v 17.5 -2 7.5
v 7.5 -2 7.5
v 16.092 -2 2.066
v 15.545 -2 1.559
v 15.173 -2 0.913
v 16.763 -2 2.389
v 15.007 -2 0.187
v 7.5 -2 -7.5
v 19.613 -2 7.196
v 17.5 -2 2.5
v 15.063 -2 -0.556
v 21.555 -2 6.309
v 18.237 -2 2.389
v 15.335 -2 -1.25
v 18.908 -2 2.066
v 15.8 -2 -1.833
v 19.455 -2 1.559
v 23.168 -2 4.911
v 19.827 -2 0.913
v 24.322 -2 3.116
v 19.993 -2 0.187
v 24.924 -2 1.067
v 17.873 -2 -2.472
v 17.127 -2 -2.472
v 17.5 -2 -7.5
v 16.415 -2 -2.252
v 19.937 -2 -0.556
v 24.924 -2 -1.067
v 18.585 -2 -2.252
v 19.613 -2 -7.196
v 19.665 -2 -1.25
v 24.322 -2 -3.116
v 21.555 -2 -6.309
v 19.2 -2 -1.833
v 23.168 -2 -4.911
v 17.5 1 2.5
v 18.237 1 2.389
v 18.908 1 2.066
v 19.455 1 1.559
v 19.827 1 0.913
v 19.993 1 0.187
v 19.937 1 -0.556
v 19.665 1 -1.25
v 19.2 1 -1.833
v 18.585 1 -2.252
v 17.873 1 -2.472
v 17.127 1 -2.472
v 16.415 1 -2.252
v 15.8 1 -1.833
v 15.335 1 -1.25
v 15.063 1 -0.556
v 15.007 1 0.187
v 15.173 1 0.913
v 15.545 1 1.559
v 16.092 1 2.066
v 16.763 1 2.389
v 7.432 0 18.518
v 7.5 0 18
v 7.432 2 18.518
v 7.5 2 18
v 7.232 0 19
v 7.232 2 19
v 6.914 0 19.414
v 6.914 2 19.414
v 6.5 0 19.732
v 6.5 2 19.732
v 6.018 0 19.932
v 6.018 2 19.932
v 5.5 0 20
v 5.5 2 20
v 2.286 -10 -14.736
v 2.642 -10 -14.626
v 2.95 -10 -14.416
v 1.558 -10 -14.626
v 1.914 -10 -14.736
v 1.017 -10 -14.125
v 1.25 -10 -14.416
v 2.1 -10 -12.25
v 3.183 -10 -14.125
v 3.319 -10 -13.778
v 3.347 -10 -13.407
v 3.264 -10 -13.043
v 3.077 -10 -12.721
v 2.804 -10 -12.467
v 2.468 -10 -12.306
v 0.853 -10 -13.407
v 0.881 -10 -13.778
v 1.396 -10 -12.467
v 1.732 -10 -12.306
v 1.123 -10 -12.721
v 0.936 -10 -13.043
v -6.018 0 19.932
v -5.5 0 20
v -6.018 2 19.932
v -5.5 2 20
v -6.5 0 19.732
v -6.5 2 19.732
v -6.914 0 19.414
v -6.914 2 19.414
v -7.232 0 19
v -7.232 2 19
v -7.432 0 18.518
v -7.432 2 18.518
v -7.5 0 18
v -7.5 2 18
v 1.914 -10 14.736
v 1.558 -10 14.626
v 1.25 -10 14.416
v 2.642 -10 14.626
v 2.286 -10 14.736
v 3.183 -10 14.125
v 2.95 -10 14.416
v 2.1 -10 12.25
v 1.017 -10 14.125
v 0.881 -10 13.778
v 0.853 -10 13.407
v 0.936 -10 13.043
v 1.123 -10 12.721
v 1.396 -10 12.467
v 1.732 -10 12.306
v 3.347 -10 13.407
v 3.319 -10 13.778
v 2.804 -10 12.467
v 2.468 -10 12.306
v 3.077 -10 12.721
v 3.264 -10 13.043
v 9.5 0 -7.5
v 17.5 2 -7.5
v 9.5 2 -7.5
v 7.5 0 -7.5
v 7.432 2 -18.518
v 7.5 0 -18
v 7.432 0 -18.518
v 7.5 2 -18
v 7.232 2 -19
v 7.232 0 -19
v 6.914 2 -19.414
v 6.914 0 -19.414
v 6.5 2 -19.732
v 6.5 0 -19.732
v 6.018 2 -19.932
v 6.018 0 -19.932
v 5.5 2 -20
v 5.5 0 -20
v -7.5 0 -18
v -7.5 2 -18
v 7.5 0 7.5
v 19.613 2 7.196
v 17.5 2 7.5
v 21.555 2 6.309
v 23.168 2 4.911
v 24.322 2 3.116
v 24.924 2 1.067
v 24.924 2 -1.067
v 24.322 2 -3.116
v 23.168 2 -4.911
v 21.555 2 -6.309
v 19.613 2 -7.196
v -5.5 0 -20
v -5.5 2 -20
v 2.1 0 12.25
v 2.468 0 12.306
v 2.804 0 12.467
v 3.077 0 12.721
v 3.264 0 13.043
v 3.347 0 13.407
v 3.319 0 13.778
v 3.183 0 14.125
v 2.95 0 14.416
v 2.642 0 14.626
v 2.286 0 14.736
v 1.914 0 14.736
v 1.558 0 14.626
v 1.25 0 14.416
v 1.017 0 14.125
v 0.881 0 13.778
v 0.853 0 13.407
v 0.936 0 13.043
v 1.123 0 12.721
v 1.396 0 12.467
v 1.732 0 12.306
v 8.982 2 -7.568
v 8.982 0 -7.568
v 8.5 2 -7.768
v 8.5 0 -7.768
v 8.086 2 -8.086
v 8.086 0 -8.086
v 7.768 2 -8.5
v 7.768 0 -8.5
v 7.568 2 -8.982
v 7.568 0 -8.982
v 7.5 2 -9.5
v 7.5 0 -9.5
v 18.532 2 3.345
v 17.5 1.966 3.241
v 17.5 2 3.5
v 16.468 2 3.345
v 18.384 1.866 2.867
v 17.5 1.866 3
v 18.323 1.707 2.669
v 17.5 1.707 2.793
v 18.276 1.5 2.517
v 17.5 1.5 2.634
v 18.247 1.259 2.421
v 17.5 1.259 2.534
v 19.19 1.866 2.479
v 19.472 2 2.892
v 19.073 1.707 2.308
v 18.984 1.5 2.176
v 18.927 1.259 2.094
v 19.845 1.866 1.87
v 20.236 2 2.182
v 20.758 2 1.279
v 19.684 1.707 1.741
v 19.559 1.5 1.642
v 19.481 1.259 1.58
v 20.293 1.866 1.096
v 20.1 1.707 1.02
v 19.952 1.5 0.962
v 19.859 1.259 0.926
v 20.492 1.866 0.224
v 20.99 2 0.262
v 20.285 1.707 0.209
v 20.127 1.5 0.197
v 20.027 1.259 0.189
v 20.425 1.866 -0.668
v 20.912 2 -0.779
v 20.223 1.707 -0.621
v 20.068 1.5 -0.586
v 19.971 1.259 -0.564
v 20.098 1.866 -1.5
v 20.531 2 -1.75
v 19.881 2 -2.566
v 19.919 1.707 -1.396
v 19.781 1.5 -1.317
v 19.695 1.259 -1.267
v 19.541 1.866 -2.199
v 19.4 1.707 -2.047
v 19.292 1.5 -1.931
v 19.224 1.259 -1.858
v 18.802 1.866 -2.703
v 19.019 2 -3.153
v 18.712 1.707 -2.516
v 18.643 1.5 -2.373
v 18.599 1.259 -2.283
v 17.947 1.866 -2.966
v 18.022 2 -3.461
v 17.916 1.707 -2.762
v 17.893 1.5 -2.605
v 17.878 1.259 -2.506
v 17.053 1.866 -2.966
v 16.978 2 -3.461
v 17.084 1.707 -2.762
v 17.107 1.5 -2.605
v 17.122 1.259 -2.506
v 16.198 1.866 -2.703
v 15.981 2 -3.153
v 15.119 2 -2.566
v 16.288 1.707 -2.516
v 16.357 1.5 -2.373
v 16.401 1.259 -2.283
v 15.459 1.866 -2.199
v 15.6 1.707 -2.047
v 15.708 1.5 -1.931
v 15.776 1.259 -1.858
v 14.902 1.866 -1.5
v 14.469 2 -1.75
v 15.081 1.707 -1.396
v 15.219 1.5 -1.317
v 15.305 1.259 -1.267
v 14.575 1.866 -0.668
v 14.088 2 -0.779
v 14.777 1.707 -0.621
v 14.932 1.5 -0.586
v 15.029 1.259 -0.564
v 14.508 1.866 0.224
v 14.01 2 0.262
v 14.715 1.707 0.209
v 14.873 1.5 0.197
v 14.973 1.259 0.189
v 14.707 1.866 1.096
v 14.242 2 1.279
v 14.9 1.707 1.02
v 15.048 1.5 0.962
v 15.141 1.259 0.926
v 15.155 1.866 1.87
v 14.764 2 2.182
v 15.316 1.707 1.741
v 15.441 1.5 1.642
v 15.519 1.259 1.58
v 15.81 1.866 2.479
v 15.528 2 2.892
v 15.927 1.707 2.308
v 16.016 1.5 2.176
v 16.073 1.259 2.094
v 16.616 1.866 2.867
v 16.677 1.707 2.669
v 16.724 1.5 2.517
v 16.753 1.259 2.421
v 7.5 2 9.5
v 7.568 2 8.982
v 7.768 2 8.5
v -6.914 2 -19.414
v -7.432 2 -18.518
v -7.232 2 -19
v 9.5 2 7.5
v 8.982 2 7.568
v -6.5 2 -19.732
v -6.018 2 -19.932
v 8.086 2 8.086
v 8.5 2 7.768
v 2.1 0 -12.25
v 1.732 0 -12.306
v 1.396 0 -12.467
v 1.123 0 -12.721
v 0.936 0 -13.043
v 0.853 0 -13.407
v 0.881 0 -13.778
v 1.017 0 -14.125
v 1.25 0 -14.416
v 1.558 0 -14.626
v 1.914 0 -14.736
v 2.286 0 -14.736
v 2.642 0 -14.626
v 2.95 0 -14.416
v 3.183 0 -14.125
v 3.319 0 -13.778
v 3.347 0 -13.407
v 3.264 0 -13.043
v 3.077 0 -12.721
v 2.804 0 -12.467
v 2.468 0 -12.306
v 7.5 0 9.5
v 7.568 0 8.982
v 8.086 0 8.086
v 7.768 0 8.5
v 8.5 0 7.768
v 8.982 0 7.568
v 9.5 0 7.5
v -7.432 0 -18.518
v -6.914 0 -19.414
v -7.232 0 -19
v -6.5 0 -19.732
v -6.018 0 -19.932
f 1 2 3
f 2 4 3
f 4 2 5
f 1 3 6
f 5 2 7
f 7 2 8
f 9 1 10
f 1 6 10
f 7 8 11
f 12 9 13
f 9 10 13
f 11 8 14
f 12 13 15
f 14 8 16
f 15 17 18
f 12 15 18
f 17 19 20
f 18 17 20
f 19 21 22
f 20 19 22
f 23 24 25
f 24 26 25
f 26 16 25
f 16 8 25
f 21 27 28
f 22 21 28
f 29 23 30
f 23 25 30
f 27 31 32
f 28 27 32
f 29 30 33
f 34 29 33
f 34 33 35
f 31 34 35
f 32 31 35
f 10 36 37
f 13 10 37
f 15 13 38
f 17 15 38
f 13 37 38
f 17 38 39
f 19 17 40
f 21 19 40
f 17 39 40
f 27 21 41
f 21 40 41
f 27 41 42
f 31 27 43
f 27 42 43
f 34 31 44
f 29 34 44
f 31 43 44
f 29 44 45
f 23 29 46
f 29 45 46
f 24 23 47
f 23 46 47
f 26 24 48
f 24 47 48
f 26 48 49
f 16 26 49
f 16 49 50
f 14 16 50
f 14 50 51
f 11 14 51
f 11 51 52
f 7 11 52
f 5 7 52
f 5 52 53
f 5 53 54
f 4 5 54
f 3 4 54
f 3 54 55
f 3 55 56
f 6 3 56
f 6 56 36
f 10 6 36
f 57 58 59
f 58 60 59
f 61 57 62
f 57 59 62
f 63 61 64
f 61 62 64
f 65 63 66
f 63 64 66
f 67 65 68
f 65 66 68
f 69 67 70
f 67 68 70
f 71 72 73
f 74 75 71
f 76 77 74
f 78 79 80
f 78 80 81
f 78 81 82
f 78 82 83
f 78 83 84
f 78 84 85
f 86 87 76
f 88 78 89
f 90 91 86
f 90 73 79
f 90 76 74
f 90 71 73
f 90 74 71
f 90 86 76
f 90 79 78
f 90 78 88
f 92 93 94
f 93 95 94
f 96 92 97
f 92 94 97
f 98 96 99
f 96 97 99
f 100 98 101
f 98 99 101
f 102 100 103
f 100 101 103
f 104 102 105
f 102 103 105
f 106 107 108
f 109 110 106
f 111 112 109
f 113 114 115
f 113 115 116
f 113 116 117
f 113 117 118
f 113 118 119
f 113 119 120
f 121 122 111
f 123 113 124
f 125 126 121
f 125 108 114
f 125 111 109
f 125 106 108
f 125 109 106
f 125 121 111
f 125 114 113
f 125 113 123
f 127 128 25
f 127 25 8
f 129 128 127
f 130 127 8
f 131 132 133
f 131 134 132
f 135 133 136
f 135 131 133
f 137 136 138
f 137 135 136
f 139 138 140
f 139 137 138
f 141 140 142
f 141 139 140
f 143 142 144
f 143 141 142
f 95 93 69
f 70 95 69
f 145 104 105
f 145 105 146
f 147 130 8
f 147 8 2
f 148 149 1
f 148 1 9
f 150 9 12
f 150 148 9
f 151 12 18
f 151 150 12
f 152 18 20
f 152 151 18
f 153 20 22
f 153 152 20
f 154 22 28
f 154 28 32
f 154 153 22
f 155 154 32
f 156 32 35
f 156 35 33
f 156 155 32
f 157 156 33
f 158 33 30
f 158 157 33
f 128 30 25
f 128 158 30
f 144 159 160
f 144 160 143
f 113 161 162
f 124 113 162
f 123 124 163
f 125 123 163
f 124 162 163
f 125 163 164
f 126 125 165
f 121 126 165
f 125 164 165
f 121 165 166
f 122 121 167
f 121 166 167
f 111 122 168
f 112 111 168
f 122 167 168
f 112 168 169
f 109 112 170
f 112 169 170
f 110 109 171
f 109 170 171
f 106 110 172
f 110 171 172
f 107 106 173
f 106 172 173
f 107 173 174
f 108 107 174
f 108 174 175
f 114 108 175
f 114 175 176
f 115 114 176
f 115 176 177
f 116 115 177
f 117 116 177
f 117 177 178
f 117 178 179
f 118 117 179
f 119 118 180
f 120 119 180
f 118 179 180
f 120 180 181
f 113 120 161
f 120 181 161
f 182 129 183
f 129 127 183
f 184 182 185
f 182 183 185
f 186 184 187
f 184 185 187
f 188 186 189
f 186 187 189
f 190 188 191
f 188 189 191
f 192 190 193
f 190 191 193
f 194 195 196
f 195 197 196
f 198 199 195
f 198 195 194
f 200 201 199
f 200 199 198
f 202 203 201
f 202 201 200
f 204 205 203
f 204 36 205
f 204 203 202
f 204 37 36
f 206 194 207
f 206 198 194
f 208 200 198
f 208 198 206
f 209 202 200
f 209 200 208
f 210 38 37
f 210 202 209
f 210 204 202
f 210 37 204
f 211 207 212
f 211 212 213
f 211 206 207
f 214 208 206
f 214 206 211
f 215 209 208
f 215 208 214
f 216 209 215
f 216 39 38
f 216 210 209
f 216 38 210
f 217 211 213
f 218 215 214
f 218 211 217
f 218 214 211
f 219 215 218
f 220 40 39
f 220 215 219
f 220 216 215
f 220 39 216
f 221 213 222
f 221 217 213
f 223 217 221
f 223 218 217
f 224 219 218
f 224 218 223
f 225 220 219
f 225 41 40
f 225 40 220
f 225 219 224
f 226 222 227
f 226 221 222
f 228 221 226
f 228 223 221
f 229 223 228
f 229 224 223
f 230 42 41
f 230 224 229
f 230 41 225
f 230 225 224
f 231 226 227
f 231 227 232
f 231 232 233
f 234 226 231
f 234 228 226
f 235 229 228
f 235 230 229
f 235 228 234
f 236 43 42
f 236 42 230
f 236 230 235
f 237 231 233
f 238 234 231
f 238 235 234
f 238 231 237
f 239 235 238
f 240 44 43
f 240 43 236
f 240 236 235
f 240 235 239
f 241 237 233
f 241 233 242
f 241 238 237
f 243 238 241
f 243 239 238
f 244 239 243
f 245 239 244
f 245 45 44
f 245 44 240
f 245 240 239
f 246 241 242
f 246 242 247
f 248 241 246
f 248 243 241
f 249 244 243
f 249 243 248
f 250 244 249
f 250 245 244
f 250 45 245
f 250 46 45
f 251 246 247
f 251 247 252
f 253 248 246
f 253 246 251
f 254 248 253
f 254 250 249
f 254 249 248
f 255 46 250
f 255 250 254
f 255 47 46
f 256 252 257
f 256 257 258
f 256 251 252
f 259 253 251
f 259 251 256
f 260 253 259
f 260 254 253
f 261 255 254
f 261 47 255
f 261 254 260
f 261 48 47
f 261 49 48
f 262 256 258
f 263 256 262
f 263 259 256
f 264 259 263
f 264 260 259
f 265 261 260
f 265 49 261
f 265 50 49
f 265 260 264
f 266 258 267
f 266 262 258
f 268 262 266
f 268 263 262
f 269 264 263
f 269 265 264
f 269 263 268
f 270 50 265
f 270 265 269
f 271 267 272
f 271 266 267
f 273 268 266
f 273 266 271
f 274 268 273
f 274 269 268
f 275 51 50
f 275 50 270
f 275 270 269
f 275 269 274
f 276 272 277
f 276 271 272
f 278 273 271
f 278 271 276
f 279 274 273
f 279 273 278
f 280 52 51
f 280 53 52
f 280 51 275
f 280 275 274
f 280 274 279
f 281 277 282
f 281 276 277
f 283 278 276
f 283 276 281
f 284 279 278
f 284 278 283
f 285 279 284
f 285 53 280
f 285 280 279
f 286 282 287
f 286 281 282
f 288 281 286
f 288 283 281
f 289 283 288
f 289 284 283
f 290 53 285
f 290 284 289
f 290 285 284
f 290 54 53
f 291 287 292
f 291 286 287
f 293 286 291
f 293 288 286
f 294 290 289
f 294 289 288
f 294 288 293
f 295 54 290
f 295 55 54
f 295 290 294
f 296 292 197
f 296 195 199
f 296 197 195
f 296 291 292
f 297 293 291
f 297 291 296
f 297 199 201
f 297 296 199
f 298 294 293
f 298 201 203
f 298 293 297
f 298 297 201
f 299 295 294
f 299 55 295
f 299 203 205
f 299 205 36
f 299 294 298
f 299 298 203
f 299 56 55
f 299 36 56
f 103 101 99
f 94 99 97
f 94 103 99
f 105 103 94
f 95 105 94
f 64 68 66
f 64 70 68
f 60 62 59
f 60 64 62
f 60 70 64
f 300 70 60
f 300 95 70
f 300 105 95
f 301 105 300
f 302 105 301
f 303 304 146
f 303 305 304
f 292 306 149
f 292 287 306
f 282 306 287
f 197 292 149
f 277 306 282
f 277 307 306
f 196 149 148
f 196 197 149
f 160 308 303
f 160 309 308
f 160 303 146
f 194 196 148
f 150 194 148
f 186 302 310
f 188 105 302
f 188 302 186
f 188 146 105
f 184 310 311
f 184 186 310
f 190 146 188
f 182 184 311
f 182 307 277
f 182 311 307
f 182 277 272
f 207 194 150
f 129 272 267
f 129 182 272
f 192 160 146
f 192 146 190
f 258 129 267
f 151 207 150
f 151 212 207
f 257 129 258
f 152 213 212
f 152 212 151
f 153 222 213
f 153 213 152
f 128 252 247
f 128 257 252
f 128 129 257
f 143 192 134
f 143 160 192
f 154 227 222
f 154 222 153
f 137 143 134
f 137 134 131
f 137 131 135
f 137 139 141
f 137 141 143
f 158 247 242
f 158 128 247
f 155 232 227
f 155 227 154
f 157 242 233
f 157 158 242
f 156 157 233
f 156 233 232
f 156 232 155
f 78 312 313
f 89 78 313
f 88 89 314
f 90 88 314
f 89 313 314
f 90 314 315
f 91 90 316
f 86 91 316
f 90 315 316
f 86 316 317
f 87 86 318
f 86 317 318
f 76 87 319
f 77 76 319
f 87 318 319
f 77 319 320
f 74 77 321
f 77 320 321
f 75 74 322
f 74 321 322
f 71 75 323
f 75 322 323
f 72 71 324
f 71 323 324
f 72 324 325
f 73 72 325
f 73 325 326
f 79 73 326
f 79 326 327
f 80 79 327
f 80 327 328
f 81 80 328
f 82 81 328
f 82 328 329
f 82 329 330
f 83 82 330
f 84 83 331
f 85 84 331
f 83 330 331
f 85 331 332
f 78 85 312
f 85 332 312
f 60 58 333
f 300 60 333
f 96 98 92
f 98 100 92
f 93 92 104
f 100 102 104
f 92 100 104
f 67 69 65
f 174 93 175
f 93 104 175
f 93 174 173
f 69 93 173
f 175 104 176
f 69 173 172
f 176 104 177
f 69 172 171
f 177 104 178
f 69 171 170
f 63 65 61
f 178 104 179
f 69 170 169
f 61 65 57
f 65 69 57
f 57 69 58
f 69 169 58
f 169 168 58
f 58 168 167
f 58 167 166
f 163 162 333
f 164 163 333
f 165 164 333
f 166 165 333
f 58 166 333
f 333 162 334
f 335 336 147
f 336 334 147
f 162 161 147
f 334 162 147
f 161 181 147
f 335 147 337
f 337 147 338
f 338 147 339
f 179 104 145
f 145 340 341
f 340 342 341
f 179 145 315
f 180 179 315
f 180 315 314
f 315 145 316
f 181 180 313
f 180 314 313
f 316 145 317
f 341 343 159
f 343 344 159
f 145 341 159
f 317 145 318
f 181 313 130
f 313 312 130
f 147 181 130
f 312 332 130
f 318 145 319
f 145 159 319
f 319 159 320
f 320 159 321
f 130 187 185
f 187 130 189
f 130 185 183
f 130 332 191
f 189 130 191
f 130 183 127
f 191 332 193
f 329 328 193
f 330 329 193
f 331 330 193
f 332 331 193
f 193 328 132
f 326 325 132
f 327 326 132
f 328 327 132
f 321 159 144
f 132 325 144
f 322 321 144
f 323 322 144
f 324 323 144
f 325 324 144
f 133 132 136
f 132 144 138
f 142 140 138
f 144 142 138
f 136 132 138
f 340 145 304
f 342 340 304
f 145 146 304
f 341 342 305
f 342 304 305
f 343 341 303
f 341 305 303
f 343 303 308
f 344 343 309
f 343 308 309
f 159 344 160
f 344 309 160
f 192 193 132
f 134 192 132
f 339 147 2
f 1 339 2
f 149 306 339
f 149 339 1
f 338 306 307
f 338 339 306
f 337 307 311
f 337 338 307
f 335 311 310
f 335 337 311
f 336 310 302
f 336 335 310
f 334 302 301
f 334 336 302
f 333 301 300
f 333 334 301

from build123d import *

# Parameters (mm, degrees)
SKETCH_1_W          = 15
SKETCH_1_H          = 40
EXTRUDE_1_DEPTH     = 2
EXTRUDE_2_DEPTH     = 4
SKETCH_3_R          = 1.25
EXTRUDE_3_DEPTH     = 10
CUT_EXTRUDE_1_REACH = 36.191
SKETCH_4_R          = 2.5
FILLET_2_R          = 1
FILLET_3_R          = 2


with BuildPart() as part:
    # 草图1 → 凸台-拉伸1 (new body)
    with BuildSketch(Plane(origin=(0, 0, 0), x_dir=(1, 0, 0), z_dir=(0, 1, 0))):
        Rectangle(SKETCH_1_W, SKETCH_1_H)
    extrude(amount=EXTRUDE_1_DEPTH)

    # 草图2 → 凸台-拉伸2 (add)
    with BuildSketch(Plane(origin=(0, 2, 0), x_dir=(1, 0, 0), z_dir=(0, 1, 0))):
        with BuildLine():
            Line((7.5, -7.5), (17.5, -7.5))
            ThreePointArc((17.5, -7.5), (25, 0), (17.5, 7.5))
            Line((17.5, 7.5), (7.5, 7.5))
            Line((7.5, 7.5), (7.5, -7.5))
        make_face()
    extrude(amount=-EXTRUDE_2_DEPTH)

    # 草图3 → 凸台-拉伸3 (add)
    with BuildSketch(Plane.XZ):
        with Locations(Location((2.1, 13.5, 0), (0, 0, 270))):
            Circle(SKETCH_3_R)
        with Locations(Location((2.1, -13.5, 0), (0, 0, 90))):
            Circle(SKETCH_3_R)
    extrude(amount=EXTRUDE_3_DEPTH)

    # 草图4 → 切除-拉伸1 (cut, up to next)
    with BuildSketch(Plane(origin=(0, 2, 0), x_dir=(1, 0, 0), z_dir=(0, 1, 0)), mode=Mode.PRIVATE) as cut_extrude_1_sk1:
        with Locations(Location((17.5, 0, 0), (0, 0, 270))):
            Circle(SKETCH_4_R)
    cut_extrude_1_tool1 = extrude(cut_extrude_1_sk1.sketch, amount=-CUT_EXTRUDE_1_REACH, mode=Mode.PRIVATE) & part.part
    add(cut_extrude_1_tool1.solids().sort_by_distance((17.5, 2, 0))[0], mode=Mode.SUBTRACT)

    # 圆角2
    fillet_2_edges = [part.edges().sort_by_distance(p)[0] for p in [
        (17.5, 2, -2.5),
    ]]
    fillet(fillet_2_edges, radius=FILLET_2_R)

    # 圆角3
    fillet_3_edges = [part.edges().sort_by_distance(p)[0] for p in [
        (7.5, 1, 7.5),
        (7.5, 1, -7.5),
        (7.5, 1, 20),
        (-7.5, 1, 20),
        (-7.5, 1, -20),
        (7.5, 1, -20),
    ]]
    fillet(fillet_3_edges, radius=FILLET_3_R)


solid = part.part
